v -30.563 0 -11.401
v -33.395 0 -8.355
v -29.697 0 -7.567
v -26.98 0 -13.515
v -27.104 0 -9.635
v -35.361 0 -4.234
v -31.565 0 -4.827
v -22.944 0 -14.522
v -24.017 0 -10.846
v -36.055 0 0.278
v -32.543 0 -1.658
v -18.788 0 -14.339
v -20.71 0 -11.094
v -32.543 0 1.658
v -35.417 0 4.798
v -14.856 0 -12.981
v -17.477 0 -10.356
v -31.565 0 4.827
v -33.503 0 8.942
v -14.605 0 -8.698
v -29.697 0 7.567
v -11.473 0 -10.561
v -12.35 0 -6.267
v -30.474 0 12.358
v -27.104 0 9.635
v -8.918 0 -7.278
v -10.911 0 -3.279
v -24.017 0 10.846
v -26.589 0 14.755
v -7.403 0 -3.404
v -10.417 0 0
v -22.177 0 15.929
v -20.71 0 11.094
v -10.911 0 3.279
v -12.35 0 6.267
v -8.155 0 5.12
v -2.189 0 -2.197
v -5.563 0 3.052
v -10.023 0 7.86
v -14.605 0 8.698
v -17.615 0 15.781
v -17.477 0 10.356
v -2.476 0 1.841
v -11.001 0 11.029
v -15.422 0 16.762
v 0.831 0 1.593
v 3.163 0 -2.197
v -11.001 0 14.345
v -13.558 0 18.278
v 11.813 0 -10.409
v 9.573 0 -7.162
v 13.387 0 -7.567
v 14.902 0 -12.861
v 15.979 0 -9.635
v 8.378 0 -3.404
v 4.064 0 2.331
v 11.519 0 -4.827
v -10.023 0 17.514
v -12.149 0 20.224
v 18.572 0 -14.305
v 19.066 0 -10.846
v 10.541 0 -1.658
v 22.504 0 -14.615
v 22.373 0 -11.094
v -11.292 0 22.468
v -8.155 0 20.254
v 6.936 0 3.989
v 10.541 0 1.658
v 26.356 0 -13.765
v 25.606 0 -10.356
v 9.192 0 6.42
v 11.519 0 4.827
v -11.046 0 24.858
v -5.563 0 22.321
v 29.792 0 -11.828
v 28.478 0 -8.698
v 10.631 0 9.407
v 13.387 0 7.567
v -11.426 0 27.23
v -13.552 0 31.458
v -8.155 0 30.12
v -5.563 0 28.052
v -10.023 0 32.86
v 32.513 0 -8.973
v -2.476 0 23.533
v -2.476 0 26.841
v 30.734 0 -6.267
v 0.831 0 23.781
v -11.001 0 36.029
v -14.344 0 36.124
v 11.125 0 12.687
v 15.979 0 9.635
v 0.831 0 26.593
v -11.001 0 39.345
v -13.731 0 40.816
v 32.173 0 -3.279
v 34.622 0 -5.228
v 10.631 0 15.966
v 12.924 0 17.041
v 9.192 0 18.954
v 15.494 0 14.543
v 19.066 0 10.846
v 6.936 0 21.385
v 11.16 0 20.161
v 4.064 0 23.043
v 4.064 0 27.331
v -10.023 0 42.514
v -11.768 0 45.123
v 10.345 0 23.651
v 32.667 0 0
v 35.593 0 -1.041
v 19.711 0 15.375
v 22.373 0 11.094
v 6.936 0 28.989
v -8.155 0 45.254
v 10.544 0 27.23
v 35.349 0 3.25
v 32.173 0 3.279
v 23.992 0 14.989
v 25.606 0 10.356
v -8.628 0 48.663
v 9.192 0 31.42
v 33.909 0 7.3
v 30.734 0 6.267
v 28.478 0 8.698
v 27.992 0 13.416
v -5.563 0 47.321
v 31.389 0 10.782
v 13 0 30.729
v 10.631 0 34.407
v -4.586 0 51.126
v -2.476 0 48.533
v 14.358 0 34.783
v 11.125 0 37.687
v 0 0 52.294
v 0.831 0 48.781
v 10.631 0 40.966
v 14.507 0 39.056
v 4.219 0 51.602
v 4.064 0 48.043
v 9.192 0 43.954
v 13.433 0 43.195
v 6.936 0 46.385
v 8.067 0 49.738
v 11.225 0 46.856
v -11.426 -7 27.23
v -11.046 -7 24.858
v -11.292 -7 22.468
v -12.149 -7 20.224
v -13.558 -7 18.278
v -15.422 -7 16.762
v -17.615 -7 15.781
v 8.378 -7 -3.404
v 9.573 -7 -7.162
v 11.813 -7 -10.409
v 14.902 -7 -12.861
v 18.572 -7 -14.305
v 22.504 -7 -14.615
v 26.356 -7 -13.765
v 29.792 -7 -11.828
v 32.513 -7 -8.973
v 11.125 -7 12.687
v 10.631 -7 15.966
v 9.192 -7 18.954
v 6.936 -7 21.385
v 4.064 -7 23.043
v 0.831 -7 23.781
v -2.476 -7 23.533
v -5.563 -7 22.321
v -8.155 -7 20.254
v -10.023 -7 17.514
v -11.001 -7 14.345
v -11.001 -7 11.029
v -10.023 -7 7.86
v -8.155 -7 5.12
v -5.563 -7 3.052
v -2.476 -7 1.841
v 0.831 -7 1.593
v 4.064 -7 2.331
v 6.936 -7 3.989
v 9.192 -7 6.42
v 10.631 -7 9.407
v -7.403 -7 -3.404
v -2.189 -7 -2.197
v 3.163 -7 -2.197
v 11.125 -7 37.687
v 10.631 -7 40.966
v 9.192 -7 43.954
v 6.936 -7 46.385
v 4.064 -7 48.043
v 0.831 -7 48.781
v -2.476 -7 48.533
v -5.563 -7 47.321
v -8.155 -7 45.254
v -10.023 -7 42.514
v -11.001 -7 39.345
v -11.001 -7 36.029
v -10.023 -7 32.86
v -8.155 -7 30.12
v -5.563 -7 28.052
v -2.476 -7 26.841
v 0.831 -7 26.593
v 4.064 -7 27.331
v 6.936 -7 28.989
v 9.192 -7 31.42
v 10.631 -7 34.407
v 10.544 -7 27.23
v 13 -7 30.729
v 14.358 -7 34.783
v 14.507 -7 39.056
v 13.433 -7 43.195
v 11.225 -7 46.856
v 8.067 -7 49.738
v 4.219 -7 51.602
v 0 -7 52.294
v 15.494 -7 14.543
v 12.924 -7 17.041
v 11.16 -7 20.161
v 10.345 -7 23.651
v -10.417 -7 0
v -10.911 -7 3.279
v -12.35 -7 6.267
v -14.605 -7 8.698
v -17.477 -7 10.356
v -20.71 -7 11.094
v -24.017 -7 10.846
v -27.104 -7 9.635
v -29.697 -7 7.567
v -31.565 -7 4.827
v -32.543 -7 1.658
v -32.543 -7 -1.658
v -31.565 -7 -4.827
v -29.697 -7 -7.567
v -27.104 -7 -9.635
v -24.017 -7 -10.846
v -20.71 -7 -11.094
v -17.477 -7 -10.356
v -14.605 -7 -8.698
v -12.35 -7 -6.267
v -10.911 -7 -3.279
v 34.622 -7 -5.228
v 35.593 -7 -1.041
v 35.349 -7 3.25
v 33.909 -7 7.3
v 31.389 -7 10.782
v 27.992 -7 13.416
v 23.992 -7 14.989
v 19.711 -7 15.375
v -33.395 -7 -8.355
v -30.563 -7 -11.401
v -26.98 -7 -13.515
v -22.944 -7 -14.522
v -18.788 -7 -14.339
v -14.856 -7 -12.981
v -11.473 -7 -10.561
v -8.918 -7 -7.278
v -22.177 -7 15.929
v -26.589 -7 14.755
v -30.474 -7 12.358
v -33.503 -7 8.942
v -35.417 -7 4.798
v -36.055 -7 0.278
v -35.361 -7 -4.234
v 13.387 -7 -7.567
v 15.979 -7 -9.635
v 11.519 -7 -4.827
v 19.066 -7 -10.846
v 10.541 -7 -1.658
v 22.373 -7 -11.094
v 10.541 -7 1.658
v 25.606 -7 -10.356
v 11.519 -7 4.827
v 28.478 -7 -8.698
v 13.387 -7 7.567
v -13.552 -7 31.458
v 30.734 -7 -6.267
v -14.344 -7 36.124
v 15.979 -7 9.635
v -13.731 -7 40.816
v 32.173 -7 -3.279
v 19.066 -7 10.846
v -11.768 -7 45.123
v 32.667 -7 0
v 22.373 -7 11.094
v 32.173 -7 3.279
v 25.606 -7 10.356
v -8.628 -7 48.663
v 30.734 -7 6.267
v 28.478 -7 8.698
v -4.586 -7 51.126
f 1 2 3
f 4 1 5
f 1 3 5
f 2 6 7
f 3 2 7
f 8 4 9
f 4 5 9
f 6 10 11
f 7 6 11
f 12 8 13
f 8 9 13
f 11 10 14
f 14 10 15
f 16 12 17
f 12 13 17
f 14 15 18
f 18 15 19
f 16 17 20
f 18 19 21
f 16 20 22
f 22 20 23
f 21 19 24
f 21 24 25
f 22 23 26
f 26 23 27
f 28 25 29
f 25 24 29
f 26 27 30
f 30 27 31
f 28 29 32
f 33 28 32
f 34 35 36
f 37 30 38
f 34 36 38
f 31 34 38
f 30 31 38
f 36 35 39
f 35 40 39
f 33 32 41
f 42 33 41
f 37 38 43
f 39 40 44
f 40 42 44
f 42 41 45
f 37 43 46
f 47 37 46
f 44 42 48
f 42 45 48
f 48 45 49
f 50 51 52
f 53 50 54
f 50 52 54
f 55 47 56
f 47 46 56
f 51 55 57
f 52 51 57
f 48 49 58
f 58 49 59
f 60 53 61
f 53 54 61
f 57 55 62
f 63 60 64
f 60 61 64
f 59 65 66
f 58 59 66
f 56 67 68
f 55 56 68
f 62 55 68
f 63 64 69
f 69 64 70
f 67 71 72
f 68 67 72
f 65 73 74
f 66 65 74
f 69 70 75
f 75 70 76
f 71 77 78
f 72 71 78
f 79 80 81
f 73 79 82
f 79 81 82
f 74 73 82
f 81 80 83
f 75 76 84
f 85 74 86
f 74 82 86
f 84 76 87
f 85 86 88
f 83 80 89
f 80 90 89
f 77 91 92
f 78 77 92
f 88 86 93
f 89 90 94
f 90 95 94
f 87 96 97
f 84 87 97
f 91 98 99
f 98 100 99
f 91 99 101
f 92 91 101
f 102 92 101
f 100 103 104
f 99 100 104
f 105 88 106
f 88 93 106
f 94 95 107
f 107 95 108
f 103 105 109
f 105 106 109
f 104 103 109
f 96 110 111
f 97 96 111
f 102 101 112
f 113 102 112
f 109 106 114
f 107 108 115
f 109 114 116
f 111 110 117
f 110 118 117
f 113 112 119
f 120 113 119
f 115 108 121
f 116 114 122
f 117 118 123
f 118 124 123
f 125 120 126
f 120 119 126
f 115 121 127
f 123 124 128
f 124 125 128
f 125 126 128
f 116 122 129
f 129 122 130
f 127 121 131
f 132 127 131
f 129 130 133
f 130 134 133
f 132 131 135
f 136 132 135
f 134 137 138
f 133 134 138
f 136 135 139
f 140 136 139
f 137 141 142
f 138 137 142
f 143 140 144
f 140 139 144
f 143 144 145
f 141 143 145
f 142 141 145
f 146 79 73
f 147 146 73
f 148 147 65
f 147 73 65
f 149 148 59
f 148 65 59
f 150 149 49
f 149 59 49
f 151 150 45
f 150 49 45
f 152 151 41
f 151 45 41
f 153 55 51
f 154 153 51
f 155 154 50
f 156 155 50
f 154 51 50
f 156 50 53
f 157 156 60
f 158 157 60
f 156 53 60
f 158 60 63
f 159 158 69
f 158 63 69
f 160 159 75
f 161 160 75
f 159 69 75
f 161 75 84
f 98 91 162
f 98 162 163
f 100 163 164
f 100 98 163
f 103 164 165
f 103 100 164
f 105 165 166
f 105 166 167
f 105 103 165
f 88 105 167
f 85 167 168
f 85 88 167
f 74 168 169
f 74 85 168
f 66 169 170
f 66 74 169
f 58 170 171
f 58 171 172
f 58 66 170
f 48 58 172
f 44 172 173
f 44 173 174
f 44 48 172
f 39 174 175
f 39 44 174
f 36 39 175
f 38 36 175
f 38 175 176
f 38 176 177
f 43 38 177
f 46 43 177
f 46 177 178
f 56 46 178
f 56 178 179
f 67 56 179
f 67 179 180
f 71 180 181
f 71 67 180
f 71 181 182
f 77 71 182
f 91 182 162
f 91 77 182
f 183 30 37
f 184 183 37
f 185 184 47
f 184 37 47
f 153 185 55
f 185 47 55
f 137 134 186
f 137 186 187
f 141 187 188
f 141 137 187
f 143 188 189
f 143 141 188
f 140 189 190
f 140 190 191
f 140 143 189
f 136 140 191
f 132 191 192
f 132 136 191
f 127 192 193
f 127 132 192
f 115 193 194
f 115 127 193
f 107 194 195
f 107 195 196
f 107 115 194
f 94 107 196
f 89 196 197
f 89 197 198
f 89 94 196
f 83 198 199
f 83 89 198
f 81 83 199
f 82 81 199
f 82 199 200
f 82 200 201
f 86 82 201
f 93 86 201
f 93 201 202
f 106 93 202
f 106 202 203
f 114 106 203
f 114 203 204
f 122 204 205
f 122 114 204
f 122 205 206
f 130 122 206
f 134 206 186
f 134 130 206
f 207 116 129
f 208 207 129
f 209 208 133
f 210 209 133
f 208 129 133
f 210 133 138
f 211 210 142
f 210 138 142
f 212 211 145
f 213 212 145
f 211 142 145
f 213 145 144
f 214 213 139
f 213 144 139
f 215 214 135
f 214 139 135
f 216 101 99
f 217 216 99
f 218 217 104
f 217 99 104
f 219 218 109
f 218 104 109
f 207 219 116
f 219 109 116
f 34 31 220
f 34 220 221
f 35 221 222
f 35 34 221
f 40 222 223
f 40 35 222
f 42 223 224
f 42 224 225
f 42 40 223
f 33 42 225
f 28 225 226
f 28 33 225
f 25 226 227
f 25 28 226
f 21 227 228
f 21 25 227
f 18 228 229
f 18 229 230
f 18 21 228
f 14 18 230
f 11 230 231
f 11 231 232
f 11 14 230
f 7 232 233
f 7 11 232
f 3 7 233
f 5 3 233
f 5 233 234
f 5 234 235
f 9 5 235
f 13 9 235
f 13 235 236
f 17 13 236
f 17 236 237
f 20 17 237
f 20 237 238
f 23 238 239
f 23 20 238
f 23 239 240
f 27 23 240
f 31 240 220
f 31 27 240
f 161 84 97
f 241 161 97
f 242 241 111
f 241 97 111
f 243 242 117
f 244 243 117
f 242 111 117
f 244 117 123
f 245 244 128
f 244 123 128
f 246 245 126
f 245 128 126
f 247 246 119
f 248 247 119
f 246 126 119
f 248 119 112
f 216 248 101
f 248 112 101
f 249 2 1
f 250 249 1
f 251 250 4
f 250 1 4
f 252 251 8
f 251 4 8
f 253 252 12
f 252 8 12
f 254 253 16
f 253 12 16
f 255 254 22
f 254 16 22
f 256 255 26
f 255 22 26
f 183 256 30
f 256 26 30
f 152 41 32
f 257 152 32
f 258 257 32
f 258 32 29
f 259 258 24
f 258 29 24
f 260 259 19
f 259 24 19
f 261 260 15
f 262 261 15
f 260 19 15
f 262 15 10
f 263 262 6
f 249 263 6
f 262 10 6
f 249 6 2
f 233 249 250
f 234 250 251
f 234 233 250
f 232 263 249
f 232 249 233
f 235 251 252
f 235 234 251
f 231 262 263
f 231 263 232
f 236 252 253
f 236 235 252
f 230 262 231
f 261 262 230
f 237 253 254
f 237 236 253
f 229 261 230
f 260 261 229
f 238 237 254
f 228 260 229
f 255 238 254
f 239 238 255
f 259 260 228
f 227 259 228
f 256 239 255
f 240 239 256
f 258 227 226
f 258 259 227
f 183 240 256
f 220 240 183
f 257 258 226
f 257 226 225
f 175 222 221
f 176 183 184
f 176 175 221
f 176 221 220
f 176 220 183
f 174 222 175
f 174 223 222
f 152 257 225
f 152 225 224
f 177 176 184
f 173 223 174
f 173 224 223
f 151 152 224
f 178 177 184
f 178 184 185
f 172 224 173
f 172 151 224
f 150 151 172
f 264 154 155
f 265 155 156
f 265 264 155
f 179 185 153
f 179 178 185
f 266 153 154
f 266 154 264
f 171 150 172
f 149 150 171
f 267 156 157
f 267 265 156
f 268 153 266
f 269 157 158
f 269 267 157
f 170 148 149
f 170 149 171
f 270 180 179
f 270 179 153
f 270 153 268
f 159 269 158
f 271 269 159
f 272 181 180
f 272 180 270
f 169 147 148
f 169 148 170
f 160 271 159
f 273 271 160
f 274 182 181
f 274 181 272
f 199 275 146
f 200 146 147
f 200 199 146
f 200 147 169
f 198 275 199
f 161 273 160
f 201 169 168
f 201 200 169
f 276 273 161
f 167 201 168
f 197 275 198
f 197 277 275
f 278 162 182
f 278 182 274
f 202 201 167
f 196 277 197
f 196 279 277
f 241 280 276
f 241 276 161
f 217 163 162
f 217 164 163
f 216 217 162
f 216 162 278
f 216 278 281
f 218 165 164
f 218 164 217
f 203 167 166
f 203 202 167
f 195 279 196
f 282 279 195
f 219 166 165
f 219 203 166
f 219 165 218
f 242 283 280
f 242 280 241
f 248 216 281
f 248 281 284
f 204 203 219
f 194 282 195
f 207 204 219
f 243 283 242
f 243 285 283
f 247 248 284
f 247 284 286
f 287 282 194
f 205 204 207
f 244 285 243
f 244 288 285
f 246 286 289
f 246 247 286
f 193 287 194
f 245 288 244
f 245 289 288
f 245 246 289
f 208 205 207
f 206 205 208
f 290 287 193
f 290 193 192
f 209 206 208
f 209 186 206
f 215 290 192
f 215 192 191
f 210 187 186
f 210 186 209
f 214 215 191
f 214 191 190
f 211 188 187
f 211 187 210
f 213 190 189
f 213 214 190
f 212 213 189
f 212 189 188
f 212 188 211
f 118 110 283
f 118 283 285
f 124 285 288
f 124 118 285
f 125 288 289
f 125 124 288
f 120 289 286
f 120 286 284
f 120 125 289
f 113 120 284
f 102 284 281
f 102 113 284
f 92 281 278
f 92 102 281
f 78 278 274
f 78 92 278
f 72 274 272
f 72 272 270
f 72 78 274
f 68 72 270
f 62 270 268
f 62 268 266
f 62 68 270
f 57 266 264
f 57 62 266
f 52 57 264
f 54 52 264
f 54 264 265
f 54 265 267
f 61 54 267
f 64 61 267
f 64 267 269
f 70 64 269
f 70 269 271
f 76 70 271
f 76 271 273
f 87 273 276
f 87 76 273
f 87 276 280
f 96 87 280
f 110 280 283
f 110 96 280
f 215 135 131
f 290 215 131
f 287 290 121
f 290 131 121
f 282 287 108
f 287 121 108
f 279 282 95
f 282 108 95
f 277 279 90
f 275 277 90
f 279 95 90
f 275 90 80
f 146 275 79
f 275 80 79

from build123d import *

# Parameters (mm, degrees)
F0_R     = 11.125
F1_DEPTH = 7


with BuildPart() as f1:
    # F0 (on Front) → F1 (new body)
    with BuildSketch(Plane.XZ):
        with BuildLine():
            ThreePointArc((-11.425942, 27.229862), (-12.149095, 20.2237), (-17.614547, 15.780944))
            ThreePointArc((-17.614547, 15.780944), (-33.50268, 8.942403), (-33.395492, -8.354617))
            ThreePointArc((-33.395492, -8.354617), (-18.787986, -14.339204), (-7.403348, -3.403733))
            ThreePointArc((-7.403348, -3.403733), (0.487123, -2.044763), (8.377595, -3.403733))
            ThreePointArc((8.377595, -3.403733), (18.572382, -14.304901), (32.513153, -8.973477))
            ThreePointArc((32.513153, -8.973477), (32.772871, 9.130893), (15.494492, 14.543222))
            ThreePointArc((15.494492, 14.543222), (11.160472, 20.161243), (10.543607, 27.229862))
            ThreePointArc((10.543607, 27.229862), (13.432728, 43.194843), (0, 52.293714))
            ThreePointArc((0, 52.293714), (-12.910225, 43.042824), (-11.425942, 27.229862))
        make_face()
        with Locations((-21.5418, 0)):
            Circle(F0_R, mode=Mode.SUBTRACT)
        with Locations((21.5418, 0)):
            Circle(F0_R, mode=Mode.SUBTRACT)
        with Locations((0, 12.686641)):
            Circle(F0_R, mode=Mode.SUBTRACT)
        with Locations((0, 37.686641)):
            Circle(F0_R, mode=Mode.SUBTRACT)
    extrude(amount=F1_DEPTH)


solid = f1.part
